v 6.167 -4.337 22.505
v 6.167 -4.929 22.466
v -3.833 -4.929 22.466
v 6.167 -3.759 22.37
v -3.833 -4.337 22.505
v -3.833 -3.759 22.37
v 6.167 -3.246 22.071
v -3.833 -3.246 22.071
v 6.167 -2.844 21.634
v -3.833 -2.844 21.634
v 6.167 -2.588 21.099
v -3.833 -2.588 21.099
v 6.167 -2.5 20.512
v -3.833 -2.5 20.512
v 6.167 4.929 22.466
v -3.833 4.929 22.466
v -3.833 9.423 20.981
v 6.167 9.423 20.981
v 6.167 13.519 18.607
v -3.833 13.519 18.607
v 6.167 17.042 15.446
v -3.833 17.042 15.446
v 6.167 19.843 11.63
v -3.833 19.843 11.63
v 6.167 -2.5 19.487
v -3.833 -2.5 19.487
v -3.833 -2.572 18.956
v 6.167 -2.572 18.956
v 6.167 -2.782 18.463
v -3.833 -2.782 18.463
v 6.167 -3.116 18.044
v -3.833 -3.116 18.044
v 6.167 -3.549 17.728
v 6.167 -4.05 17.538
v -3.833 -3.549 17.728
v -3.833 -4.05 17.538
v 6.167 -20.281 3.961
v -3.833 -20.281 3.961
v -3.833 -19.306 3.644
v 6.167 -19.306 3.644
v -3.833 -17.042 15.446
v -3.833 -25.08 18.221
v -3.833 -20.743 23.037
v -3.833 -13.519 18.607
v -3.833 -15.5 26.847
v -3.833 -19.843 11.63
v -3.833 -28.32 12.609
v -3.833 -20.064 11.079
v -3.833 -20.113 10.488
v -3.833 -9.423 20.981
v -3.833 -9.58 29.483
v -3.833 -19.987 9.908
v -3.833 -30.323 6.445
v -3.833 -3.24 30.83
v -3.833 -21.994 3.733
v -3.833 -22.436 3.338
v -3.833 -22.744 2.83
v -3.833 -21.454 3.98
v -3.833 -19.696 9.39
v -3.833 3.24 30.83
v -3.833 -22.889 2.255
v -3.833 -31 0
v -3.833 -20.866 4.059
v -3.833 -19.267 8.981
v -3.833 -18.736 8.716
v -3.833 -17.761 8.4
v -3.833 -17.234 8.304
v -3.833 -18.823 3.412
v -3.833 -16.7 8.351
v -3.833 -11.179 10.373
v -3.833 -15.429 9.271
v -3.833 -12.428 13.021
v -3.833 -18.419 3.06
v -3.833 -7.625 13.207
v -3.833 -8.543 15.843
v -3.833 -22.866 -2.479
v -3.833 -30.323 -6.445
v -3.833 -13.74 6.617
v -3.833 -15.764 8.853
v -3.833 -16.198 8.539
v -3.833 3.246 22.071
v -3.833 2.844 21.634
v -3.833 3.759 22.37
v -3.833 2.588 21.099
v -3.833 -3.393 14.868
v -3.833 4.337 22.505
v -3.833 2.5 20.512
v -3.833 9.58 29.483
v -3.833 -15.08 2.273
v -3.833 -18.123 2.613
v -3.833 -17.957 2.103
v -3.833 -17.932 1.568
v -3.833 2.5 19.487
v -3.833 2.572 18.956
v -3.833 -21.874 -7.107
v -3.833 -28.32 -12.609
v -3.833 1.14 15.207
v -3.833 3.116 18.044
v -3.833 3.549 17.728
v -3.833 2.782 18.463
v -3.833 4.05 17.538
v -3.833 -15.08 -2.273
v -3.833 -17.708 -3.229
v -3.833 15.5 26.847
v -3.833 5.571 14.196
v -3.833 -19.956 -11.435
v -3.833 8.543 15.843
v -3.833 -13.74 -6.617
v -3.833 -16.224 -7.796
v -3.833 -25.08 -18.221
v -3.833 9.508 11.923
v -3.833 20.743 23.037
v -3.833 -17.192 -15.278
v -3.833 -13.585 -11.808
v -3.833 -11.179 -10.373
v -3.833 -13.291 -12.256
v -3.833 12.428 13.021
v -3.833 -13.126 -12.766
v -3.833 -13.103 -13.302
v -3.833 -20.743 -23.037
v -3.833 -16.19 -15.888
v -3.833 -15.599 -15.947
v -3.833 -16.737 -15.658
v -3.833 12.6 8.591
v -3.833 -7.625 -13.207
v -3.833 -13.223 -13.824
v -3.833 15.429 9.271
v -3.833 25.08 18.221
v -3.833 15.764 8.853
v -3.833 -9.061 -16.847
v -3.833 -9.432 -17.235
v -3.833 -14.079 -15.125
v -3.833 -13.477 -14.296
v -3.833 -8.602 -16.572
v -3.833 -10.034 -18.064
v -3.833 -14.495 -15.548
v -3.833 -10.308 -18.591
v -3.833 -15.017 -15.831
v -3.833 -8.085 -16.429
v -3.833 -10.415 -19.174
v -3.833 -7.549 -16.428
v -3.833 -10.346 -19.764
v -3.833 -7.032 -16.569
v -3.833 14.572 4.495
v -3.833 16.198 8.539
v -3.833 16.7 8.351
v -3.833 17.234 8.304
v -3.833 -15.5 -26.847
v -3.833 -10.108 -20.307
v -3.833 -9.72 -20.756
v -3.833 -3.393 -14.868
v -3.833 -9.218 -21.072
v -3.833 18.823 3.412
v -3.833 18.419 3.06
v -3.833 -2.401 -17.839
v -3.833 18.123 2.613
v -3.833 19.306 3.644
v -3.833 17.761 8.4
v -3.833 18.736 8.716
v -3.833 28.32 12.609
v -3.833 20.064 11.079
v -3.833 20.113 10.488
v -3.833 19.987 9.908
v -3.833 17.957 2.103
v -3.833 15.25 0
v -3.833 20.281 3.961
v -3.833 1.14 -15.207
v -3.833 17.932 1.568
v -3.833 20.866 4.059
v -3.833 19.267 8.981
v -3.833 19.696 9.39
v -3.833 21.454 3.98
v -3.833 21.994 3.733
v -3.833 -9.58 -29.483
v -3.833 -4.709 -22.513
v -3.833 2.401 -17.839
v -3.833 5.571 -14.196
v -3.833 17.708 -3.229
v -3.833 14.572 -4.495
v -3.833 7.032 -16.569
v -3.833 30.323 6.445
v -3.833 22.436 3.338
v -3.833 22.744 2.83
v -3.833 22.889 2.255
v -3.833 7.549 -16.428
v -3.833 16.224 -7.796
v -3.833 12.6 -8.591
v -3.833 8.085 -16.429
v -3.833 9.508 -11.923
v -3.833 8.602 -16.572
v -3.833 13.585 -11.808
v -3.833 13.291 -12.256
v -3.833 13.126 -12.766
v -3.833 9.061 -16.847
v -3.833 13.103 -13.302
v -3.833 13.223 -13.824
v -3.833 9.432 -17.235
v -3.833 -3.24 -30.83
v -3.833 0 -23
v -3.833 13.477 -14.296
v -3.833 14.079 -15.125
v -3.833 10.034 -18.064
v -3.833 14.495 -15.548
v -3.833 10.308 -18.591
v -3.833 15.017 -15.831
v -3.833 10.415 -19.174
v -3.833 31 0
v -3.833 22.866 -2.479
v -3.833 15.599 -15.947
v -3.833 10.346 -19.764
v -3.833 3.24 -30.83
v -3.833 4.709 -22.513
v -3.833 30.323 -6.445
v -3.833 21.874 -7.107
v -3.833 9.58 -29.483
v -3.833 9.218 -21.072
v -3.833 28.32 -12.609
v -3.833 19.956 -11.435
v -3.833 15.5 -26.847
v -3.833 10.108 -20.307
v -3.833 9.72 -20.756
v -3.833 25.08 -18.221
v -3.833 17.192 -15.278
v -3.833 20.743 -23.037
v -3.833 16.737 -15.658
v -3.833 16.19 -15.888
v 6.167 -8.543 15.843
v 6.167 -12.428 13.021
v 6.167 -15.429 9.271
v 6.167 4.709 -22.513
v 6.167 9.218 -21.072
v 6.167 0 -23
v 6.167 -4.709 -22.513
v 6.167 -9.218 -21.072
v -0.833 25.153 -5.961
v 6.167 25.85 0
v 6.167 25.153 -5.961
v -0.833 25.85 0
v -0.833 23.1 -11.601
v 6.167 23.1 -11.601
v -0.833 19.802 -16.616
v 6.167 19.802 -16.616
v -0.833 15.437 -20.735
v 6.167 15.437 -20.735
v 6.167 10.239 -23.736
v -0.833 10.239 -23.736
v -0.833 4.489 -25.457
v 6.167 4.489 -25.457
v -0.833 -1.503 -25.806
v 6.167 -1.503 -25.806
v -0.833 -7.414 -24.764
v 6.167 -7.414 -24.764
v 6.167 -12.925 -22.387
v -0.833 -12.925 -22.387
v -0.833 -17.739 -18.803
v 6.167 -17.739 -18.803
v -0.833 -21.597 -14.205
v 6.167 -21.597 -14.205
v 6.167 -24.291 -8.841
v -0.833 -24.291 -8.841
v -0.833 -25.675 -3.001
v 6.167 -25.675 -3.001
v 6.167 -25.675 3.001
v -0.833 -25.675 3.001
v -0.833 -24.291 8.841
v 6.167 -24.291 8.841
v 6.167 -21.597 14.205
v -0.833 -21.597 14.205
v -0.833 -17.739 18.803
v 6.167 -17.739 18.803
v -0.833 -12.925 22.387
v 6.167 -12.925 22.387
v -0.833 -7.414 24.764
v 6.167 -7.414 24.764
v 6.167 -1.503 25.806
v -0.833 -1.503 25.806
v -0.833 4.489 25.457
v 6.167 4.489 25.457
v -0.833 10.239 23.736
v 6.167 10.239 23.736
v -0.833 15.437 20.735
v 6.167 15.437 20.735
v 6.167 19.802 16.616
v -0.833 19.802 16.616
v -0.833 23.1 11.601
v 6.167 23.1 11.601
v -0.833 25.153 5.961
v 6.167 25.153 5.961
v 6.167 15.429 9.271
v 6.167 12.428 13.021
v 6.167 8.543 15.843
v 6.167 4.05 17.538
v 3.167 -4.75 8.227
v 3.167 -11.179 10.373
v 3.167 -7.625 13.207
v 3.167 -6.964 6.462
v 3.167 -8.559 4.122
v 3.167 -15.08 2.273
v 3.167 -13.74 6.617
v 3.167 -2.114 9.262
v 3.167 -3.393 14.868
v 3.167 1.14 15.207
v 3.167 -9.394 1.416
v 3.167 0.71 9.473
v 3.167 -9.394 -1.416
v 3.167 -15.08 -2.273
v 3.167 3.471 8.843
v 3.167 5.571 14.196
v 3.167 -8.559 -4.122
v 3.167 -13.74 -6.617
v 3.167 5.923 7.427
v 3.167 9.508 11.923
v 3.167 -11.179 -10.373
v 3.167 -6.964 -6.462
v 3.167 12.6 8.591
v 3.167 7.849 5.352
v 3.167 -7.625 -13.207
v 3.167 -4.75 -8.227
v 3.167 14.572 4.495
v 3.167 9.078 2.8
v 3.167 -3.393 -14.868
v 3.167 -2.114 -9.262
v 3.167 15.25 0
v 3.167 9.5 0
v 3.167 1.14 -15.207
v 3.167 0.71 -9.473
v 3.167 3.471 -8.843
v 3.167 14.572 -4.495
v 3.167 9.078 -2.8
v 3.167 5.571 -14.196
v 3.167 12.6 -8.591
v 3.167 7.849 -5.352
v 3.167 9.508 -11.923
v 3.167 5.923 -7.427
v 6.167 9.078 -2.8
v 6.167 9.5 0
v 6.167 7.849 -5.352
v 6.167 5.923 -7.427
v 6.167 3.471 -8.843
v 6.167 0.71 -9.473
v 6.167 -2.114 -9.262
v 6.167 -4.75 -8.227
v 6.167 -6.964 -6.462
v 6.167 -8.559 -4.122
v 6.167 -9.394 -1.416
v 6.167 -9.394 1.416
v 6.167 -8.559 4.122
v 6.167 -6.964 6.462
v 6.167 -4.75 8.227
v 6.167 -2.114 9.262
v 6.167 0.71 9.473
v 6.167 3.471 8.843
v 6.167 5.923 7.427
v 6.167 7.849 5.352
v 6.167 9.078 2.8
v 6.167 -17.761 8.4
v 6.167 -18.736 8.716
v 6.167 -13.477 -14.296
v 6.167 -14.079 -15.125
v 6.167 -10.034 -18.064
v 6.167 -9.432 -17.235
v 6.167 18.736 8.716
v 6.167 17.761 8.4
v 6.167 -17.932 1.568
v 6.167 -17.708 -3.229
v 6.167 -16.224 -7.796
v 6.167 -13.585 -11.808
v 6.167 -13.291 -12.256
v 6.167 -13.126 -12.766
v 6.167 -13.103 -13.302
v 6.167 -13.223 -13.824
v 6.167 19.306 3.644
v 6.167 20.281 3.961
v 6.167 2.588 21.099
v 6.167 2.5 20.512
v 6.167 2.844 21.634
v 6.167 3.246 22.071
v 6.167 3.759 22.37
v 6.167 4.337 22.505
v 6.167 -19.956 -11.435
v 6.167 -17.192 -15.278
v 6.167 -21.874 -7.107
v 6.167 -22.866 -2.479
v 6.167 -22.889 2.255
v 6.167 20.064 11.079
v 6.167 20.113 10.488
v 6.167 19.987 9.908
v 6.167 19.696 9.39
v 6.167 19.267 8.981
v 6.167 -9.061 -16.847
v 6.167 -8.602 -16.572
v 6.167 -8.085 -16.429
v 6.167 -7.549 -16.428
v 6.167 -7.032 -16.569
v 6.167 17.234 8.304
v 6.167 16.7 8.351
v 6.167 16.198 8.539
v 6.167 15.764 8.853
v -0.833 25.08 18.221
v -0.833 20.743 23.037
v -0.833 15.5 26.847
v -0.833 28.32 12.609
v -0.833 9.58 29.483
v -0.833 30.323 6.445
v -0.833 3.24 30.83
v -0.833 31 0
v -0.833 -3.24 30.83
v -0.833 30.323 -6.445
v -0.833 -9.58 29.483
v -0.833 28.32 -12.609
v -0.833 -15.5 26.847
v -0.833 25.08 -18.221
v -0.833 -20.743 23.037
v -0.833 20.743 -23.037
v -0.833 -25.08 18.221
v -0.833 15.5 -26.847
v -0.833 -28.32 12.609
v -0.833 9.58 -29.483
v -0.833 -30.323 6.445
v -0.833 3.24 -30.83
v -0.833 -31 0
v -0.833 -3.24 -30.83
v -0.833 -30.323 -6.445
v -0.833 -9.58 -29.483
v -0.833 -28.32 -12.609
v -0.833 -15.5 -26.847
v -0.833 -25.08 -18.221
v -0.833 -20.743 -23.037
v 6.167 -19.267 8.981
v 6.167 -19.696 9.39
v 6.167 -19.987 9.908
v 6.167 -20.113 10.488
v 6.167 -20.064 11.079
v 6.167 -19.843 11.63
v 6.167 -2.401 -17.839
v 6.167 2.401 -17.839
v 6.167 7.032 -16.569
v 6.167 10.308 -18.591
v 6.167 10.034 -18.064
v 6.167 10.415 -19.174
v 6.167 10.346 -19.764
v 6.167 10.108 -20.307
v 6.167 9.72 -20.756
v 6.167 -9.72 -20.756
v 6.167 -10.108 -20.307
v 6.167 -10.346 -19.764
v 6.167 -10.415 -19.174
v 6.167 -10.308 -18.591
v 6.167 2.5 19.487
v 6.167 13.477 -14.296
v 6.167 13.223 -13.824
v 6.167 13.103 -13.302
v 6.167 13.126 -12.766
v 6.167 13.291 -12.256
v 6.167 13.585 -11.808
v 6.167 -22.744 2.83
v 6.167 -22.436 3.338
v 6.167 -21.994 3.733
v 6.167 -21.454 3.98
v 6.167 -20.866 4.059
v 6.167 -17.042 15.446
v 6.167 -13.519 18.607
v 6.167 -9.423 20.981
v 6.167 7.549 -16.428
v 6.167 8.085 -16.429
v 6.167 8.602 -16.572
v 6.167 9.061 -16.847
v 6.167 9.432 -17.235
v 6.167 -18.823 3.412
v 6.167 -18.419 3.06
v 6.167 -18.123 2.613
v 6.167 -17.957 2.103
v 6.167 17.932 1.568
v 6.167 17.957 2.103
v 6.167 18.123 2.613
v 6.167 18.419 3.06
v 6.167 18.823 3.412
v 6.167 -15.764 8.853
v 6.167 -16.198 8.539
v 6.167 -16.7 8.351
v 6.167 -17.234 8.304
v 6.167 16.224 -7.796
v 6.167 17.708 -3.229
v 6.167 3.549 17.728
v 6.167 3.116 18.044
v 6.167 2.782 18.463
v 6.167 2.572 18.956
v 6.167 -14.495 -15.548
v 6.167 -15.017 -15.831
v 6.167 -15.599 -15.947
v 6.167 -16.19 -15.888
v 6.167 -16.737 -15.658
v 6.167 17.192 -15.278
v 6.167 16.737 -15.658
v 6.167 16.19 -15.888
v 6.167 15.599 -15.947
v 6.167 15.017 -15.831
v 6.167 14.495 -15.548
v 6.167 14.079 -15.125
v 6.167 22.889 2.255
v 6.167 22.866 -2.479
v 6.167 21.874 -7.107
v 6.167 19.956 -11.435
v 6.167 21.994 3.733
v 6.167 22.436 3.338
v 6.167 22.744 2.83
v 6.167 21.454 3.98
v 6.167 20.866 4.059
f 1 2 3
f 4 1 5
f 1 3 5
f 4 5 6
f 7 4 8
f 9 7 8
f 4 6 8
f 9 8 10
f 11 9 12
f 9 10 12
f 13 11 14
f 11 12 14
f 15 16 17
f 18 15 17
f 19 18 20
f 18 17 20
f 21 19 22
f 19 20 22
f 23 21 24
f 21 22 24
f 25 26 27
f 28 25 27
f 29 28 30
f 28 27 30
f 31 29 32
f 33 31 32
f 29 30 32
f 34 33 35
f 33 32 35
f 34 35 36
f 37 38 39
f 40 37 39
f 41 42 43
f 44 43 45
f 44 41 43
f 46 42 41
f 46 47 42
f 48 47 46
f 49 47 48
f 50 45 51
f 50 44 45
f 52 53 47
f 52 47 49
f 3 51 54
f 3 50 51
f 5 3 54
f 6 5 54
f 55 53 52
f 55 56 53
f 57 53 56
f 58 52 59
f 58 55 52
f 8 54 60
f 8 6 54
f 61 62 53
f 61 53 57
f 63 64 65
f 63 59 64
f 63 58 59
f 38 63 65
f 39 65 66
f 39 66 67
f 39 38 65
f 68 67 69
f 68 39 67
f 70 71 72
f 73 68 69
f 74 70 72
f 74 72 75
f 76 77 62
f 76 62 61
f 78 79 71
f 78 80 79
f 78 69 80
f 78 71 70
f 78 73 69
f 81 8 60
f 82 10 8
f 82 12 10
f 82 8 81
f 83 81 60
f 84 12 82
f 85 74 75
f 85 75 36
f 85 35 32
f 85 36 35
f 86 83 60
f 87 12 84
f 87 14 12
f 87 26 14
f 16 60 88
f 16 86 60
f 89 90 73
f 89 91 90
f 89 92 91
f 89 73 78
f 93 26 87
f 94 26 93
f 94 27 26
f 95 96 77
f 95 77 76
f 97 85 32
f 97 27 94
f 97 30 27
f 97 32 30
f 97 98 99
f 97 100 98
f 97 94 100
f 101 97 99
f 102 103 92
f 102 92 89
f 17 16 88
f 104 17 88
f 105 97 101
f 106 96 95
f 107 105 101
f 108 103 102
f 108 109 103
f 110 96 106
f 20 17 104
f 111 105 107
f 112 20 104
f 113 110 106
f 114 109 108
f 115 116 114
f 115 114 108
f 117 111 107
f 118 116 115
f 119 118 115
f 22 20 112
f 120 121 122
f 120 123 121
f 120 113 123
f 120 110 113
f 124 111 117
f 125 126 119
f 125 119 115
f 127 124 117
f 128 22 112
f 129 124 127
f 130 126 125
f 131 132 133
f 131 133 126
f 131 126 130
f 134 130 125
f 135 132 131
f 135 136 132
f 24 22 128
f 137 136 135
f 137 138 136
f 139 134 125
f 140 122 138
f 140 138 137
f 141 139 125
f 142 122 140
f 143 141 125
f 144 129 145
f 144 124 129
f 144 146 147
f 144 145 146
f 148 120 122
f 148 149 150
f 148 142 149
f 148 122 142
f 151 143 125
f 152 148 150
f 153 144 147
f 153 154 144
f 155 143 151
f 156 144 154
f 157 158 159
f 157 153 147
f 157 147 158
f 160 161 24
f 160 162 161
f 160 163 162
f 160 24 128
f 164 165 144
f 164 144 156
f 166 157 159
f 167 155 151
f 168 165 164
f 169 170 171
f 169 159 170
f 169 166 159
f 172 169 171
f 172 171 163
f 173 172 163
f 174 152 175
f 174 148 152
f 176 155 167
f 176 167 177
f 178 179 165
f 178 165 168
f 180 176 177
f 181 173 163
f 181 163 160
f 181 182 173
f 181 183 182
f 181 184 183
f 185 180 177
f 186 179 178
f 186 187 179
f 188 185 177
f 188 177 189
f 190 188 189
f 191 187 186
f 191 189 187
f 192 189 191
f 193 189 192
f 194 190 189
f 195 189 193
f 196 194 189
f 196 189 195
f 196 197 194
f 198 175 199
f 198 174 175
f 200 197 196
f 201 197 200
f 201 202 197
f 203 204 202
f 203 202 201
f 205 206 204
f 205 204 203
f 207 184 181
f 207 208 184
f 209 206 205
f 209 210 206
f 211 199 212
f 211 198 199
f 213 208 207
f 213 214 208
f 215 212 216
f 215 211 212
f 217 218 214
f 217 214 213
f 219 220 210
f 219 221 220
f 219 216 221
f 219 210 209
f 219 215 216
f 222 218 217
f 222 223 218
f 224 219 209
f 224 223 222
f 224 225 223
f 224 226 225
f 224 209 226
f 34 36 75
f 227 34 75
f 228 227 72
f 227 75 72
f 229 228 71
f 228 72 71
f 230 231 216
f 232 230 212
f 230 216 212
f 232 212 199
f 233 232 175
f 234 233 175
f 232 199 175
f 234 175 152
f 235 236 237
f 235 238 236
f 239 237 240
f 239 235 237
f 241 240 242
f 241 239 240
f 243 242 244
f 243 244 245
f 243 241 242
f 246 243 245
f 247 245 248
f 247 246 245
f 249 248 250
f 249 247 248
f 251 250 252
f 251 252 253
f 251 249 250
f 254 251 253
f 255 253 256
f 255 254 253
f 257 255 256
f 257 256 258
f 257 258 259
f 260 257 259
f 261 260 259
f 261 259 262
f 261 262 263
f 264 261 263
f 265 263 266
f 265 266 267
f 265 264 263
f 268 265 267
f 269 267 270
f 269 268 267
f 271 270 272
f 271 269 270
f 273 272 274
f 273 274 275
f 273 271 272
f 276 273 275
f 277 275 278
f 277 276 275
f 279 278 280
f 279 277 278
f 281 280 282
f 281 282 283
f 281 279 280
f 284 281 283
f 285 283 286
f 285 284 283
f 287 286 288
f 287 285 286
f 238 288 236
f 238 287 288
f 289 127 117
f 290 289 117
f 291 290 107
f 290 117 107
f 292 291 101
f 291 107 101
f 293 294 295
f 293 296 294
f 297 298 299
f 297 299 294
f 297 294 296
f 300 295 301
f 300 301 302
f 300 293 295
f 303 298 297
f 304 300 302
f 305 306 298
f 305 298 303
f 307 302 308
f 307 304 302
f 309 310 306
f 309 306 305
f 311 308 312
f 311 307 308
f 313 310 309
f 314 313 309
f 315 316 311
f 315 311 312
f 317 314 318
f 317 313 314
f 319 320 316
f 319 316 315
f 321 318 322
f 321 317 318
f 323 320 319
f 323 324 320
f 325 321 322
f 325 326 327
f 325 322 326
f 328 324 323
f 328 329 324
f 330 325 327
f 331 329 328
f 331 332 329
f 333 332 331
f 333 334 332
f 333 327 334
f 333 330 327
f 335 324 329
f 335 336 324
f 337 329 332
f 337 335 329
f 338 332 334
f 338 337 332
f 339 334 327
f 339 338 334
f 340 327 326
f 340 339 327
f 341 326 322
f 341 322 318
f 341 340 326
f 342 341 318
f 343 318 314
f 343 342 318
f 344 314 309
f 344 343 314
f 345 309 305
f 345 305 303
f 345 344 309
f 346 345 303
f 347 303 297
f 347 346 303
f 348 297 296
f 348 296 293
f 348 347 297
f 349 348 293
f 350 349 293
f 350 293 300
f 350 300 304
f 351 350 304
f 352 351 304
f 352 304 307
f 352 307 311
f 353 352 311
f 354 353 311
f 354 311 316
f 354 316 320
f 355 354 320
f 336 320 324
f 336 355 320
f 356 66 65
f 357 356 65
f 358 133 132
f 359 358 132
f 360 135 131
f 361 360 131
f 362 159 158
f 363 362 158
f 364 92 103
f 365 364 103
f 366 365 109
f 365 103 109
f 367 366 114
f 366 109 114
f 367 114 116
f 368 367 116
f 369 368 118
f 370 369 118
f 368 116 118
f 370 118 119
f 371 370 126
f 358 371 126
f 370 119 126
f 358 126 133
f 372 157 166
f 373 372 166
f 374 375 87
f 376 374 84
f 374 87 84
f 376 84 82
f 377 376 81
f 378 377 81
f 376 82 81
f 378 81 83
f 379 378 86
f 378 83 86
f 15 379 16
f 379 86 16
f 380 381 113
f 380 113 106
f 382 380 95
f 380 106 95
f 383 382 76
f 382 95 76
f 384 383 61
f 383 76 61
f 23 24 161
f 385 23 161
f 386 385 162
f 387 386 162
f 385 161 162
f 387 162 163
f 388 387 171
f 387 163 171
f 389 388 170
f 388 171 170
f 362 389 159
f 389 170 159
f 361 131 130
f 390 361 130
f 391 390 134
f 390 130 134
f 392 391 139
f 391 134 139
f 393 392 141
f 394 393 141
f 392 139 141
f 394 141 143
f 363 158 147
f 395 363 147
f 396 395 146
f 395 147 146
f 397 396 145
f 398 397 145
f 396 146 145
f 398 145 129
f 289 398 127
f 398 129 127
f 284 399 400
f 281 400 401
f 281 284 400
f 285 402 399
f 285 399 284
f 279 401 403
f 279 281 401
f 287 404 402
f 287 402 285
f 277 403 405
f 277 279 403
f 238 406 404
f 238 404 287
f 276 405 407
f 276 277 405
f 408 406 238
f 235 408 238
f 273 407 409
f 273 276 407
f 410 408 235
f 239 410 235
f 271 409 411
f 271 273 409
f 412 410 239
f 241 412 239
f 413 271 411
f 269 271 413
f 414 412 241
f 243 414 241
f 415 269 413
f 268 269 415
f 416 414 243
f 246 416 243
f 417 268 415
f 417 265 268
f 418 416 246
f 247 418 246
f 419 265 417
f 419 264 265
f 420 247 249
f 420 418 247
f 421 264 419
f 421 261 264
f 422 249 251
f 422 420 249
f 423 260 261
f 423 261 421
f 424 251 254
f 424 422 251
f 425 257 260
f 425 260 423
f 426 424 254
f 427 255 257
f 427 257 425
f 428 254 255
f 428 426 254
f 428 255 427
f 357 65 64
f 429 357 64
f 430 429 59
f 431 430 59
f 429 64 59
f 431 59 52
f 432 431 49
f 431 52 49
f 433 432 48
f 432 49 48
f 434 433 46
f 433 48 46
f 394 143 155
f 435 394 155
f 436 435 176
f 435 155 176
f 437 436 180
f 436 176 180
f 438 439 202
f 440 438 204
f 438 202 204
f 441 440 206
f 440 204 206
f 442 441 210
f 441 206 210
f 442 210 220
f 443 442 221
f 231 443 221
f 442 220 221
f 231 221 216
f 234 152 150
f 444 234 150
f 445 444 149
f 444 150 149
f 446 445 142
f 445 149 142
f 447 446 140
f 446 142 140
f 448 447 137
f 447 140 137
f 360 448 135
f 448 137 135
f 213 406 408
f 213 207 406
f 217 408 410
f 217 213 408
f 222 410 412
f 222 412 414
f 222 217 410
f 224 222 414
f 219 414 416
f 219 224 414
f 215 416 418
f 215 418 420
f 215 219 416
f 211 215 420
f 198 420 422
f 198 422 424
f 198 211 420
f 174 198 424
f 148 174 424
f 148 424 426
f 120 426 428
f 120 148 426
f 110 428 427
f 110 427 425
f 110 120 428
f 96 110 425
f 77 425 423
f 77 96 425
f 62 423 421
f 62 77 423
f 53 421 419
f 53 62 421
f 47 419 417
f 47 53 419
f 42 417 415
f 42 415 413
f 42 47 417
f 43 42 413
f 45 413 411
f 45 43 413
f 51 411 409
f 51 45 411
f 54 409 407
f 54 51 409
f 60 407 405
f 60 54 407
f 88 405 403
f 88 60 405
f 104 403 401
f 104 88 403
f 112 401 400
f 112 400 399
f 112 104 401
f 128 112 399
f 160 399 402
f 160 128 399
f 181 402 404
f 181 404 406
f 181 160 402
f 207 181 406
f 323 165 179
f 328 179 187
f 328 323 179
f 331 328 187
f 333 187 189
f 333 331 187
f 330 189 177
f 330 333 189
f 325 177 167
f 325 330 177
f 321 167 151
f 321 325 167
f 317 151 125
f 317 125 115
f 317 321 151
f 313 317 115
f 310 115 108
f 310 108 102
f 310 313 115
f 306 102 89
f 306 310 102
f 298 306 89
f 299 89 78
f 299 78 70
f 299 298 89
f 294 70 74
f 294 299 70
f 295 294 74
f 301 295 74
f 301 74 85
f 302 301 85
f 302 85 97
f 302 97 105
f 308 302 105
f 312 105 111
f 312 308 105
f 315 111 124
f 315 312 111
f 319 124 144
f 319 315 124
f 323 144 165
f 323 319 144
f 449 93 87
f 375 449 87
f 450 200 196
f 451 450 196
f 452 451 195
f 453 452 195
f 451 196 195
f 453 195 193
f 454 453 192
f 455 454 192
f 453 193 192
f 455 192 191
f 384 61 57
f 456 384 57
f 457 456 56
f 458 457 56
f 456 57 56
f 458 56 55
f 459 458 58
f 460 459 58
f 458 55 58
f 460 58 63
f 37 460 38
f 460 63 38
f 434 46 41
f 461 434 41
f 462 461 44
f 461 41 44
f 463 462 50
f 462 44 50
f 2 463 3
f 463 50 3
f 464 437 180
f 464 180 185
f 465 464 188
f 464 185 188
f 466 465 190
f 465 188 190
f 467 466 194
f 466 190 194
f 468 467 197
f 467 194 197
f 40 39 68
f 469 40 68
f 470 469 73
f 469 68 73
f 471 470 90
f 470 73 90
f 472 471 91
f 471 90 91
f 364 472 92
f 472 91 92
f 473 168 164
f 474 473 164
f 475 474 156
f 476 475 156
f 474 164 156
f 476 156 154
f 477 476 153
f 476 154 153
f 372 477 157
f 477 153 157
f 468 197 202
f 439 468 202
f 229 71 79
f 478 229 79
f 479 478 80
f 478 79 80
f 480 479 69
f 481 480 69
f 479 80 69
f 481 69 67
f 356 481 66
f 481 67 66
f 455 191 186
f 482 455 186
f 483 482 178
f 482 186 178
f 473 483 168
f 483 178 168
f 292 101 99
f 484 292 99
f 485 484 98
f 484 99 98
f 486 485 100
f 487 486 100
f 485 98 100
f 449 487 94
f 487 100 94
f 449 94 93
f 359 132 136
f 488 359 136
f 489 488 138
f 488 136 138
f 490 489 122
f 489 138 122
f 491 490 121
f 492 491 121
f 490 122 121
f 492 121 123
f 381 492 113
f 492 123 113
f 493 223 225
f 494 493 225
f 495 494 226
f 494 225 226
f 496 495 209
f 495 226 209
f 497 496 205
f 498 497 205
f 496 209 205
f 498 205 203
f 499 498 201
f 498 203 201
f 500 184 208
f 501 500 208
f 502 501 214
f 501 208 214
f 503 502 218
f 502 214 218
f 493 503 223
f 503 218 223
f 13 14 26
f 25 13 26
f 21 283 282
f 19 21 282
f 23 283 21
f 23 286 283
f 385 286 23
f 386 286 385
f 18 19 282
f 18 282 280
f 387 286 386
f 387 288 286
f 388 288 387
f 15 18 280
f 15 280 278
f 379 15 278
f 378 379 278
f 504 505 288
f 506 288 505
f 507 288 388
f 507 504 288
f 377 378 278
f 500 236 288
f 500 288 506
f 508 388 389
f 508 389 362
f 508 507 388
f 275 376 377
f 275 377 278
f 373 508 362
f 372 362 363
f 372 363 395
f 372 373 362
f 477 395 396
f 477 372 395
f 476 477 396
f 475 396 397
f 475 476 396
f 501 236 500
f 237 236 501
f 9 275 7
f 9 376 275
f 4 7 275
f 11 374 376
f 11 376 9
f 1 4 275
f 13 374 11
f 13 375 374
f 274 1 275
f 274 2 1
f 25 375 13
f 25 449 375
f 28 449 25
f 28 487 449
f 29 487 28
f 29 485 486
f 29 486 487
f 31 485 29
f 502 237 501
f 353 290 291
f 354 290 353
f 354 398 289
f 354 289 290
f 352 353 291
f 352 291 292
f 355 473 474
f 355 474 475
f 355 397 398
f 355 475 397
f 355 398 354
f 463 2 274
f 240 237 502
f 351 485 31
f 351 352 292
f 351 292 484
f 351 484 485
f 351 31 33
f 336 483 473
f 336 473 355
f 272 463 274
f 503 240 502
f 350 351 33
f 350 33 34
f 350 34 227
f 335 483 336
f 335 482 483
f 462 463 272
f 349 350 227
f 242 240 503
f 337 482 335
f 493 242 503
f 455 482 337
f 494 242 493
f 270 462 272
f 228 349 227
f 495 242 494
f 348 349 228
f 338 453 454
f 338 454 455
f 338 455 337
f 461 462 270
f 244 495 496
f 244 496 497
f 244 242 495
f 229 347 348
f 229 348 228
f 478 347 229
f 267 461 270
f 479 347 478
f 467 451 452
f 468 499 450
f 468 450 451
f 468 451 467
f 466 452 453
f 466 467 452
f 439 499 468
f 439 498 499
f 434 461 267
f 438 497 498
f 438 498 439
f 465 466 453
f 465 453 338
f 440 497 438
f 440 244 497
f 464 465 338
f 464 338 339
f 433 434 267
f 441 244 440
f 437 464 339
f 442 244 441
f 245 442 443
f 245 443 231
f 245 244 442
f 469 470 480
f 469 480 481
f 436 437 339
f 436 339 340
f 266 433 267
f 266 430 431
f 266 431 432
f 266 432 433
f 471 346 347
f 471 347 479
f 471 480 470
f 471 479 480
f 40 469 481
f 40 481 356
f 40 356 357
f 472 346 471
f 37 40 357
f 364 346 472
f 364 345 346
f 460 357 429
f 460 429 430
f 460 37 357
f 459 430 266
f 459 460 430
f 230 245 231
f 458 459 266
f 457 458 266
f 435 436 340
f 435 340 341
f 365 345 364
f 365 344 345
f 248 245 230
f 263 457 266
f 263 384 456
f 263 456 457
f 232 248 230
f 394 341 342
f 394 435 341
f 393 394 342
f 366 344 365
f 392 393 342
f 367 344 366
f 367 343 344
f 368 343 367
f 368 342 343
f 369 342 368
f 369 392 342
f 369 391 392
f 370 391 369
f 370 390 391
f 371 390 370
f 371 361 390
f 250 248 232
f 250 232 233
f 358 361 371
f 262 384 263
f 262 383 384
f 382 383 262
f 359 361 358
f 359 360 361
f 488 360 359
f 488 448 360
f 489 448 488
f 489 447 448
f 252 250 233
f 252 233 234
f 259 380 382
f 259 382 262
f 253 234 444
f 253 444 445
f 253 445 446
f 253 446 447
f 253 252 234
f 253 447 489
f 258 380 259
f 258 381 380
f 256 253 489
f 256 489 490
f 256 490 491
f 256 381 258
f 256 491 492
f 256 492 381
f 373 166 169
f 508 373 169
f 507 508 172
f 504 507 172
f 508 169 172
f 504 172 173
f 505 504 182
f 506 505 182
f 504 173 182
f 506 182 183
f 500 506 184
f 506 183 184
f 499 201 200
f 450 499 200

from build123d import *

# Parameters (mm, degrees)
F3_DEPTH = 25


with BuildPart() as f1:
    # F0 (on Top) → F1 (revolve)
    with BuildSketch(Plane.XY):
        Polygon((-3.832785, 31), (-3.832785, 15.25), (3.167215, 15.25), (3.167215, 9.5), (6.167215, 9.5), (6.167215, 25.85), (-0.832785, 25.85), (-0.832785, 31), align=None)
    revolve(axis=Axis((4.667215, 0, 0), (-1, 0, 0)))

    # F2 (on face) → F3 (cut)
    with BuildSketch(Plane(origin=(-3.832785, 0, 0), x_dir=(0, -1, 0), z_dir=(-1, 0, 0))):
        with BuildLine():
            ThreePointArc((-2.5, 20.512191), (-3.246434, 22.070579), (-4.928571, 22.465734))
            ThreePointArc((-4.928571, 22.465734), (-13.519061, 18.607391), (-19.84317, 11.629643))
            ThreePointArc((-19.84317, 11.629643), (-19.987165, 9.907726), (-18.735711, 8.716257))
            Line((-18.735711, 8.716257), (-17.760863, 8.39951))
            ThreePointArc((-17.760863, 8.39951), (-16.442461, 8.428261), (-15.428546, 9.27146))
            ThreePointArc((-15.428546, 9.27146), (-10.580135, 14.562306), (-4.05, 17.538458))
            ThreePointArc((-4.05, 17.538458), (-2.934752, 18.242185), (-2.5, 19.487175))
            Line((-2.5, 19.487175), (-2.5, 20.512191))
        make_face()
        with BuildLine():
            ThreePointArc((4.928571, 22.465734), (3.246434, 22.070579), (2.5, 20.512191))
            Line((2.5, 20.512191), (2.5, 19.487175))
            ThreePointArc((2.5, 19.487175), (2.934752, 18.242185), (4.05, 17.538458))
            ThreePointArc((4.05, 17.538458), (10.580135, 14.562306), (15.428546, 9.27146))
            ThreePointArc((15.428546, 9.27146), (16.442461, 8.428261), (17.760863, 8.39951))
            Line((17.760863, 8.39951), (18.735711, 8.716257))
            ThreePointArc((18.735711, 8.716257), (19.987165, 9.907726), (19.84317, 11.629643))
            ThreePointArc((19.84317, 11.629643), (13.519061, 18.607391), (4.928571, 22.465734))
        make_face()
        with BuildLine():
            ThreePointArc((22.889195, 2.254943), (21.993571, 3.732642), (20.280796, 3.960974))
            Line((20.280796, 3.960974), (19.305948, 3.644227))
            ThreePointArc((19.305948, 3.644227), (18.256238, 2.84603), (17.931583, 1.567903))
            ThreePointArc((17.931583, 1.567903), (17.119017, -5.562306), (13.585366, -11.80838))
            ThreePointArc((13.585366, -11.80838), (13.096752, -13.033234), (13.476817, -14.295993))
            Line((13.476817, -14.295993), (14.079306, -15.125248))
            ThreePointArc((14.079306, -15.125248), (15.599181, -15.947268), (17.192325, -15.278219))
            ThreePointArc((17.192325, -15.278219), (21.8743, -7.107391), (22.889195, 2.254943))
        make_face()
        with BuildLine():
            ThreePointArc((9.217729, -21.072102), (10.346341, -19.763679), (10.034221, -18.064175))
            Line((10.034221, -18.064175), (9.431732, -17.234919))
            ThreePointArc((9.431732, -17.234919), (8.348223, -16.483242), (7.032328, -16.569441))
            ThreePointArc((7.032328, -16.569441), (0, -18), (-7.032328, -16.569441))
            ThreePointArc((-7.032328, -16.569441), (-8.348223, -16.483242), (-9.431732, -17.234919))
            Line((-9.431732, -17.234919), (-10.034221, -18.064175))
            ThreePointArc((-10.034221, -18.064175), (-10.346341, -19.763679), (-9.217729, -21.072102))
            ThreePointArc((-9.217729, -21.072102), (0, -23), (9.217729, -21.072102))
        make_face()
        with BuildLine():
            ThreePointArc((-17.192325, -15.278219), (-15.599181, -15.947268), (-14.079306, -15.125248))
            Line((-14.079306, -15.125248), (-13.476817, -14.295993))
            ThreePointArc((-13.476817, -14.295993), (-13.096752, -13.033234), (-13.585366, -11.80838))
            ThreePointArc((-13.585366, -11.80838), (-17.119017, -5.562306), (-17.931583, 1.567903))
            ThreePointArc((-17.931583, 1.567903), (-18.256238, 2.84603), (-19.305948, 3.644227))
            Line((-19.305948, 3.644227), (-20.280796, 3.960974))
            ThreePointArc((-20.280796, 3.960974), (-21.993571, 3.732642), (-22.889195, 2.254943))
            ThreePointArc((-22.889195, 2.254943), (-21.8743, -7.107391), (-17.192325, -15.278219))
        make_face()
    extrude(amount=-F3_DEPTH, mode=Mode.SUBTRACT)


solid = f1.part
